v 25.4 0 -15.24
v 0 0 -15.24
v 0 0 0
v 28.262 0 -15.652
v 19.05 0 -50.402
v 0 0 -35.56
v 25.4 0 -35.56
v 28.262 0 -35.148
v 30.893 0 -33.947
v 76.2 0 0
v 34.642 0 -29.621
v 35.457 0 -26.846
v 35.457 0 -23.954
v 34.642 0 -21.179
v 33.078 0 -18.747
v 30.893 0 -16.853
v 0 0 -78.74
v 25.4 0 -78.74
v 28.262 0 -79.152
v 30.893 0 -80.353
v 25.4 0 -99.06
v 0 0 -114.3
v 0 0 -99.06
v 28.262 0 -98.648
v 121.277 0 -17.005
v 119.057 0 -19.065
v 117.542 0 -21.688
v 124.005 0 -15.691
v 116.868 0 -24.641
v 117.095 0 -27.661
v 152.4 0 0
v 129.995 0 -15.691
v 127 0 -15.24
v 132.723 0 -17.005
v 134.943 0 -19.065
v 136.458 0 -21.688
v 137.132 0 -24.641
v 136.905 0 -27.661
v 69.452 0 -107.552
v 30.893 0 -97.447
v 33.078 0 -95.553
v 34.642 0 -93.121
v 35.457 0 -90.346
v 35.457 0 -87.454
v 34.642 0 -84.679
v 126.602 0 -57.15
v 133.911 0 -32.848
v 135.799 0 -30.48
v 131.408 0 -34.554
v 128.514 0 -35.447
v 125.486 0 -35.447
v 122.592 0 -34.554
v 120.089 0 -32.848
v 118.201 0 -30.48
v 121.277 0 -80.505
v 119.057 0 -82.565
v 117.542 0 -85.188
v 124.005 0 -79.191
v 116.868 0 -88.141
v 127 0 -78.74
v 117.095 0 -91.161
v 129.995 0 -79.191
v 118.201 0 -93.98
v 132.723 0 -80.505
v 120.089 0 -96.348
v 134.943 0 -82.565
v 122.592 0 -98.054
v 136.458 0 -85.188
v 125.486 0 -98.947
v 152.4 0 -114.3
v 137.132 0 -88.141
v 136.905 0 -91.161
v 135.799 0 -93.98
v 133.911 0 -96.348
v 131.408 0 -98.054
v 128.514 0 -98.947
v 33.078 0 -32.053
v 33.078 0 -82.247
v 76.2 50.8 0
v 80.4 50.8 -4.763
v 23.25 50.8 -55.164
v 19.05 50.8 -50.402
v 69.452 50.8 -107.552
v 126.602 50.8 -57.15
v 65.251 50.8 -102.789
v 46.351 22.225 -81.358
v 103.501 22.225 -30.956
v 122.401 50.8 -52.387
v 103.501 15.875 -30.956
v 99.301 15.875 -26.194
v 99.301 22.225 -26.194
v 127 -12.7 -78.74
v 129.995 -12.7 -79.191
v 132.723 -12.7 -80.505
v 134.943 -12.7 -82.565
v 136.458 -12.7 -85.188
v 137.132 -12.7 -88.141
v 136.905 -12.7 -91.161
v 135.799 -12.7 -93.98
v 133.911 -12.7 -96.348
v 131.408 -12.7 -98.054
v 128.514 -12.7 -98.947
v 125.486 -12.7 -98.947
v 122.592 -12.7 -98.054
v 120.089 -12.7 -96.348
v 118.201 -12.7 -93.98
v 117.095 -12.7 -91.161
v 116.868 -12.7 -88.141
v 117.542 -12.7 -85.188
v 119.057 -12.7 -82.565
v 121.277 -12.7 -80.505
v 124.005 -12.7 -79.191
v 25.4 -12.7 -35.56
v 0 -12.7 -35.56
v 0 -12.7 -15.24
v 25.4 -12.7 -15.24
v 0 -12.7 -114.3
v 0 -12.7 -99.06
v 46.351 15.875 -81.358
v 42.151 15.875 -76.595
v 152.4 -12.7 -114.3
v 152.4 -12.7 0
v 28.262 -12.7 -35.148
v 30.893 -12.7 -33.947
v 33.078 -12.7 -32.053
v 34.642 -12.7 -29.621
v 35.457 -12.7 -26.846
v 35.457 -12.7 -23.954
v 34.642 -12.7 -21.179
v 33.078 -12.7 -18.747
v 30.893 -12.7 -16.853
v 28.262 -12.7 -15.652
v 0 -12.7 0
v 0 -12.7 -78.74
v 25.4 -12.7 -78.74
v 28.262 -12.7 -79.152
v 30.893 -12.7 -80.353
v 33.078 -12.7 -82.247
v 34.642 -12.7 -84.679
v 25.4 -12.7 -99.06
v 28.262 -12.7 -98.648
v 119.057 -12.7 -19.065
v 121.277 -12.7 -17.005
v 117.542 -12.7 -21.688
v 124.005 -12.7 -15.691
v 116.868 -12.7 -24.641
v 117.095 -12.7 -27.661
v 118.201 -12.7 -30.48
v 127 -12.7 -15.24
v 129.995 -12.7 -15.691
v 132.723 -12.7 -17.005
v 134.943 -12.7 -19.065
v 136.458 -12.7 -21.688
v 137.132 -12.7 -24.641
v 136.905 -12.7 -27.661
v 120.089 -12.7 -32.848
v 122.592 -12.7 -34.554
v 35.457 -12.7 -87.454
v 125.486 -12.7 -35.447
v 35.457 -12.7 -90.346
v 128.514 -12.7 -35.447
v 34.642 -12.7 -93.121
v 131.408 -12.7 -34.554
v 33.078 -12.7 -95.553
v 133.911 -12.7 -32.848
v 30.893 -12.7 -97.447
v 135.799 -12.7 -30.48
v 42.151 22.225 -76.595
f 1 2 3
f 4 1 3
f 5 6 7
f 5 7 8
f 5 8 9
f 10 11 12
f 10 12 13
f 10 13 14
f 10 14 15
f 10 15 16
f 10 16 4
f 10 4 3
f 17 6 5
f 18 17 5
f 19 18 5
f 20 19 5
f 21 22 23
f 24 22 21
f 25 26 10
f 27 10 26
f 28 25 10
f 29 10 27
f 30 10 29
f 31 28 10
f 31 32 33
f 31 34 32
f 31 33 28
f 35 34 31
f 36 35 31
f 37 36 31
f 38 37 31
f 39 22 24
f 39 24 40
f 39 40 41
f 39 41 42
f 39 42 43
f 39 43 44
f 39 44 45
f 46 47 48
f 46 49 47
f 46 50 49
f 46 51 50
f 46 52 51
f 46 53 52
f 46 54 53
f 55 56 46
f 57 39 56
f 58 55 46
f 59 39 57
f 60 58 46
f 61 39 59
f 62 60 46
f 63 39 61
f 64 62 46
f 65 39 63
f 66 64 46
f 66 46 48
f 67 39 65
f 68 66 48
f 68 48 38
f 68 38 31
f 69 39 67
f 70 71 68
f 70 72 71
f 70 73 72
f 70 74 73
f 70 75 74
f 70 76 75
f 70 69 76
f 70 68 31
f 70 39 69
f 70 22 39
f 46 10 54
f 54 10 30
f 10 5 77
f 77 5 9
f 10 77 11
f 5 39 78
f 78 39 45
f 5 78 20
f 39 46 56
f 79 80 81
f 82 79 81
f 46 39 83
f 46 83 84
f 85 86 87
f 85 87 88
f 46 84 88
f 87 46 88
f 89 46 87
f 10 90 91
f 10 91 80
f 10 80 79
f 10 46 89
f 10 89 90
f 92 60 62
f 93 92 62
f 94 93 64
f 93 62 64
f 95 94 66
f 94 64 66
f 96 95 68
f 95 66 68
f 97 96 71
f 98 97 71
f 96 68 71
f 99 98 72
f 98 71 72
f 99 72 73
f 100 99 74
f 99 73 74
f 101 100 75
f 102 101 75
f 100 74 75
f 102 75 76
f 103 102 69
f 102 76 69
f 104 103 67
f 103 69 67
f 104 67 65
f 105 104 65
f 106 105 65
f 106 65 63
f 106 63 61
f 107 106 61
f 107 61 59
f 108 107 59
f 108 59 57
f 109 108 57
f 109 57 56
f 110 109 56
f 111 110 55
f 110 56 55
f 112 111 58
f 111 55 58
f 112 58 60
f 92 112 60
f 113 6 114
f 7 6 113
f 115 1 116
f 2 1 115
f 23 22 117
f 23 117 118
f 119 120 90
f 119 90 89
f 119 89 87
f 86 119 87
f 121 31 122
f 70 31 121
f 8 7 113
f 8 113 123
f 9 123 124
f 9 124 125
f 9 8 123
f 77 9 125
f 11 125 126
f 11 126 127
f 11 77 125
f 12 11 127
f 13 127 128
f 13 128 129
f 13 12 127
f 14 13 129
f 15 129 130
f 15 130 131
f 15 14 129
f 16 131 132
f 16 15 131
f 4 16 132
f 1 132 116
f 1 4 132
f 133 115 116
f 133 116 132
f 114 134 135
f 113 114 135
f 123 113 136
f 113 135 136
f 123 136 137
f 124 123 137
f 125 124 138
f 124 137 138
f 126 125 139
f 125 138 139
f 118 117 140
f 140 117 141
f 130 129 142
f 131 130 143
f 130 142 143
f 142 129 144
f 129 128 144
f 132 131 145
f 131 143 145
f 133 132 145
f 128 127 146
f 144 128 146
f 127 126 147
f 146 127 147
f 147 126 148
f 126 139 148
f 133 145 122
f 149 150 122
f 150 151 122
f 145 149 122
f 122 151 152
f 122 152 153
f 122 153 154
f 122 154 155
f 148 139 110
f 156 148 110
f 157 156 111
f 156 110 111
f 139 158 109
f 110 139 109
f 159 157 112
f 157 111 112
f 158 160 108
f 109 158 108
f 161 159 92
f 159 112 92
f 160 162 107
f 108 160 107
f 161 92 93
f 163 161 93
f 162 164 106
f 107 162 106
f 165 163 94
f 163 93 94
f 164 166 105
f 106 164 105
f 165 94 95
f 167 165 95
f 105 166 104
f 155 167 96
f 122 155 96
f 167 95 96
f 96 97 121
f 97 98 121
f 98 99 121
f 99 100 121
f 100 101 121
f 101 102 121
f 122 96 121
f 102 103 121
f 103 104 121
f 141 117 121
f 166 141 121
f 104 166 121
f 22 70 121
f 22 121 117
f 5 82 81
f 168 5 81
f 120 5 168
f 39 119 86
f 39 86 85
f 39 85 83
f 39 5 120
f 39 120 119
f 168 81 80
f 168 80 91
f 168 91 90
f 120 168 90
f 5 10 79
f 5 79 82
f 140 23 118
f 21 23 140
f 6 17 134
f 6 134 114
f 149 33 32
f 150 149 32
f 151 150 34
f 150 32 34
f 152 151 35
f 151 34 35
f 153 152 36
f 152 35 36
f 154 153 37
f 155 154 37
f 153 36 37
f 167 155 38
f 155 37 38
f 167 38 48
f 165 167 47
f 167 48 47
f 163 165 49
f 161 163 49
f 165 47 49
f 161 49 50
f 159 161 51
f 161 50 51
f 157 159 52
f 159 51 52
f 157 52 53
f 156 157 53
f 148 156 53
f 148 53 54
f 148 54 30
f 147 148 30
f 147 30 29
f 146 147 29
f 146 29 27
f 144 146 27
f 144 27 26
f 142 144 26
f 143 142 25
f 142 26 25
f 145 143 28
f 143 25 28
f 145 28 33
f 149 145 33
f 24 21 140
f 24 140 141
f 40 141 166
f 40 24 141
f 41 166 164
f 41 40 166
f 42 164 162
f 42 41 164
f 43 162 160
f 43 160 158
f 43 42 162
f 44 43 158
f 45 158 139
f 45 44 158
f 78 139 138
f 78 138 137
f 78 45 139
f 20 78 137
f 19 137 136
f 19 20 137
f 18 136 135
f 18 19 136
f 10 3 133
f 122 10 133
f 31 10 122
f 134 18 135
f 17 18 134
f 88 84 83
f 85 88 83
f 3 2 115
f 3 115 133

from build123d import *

# Parameters (mm, degrees)
SKETCH3_R               = 10.16
BOSS_EXTRUDE2_DEPTH     = 12.7
BOSS_EXTRUDE3_DEPTH     = 50.8
CUT_EXTRUDE1_DEPTH      = 195.200593167
CUT_EXTRUDE1_DEPTH_BACK = 195.200593167


with BuildPart() as part:
    # Sketch3 → Boss-Extrude2 (new body)
    # profile 1 of 2: a face of its own
    with BuildSketch(Plane(origin=(0, 0, 0), x_dir=(1, 0, 0), z_dir=(0, 1, 0))):
        with BuildLine():
            Line((0, 57.15), (0, 35.56))
            Line((0, 35.56), (25.4, 35.56))
            ThreePointArc((25.4, 35.56), (35.56, 25.4), (25.4, 15.24))
            Line((25.4, 15.24), (0, 15.24))
            Line((0, 15.24), (0, 0))
            Line((0, 0), (152.4, 0))
            Line((152.4, 0), (152.4, 57.15))
            Line((152.4, 57.15), (0, 57.15))
        make_face()
        with Locations(Location((127, 25.4, 0), (0, 0, 270))):
            Circle(SKETCH3_R, mode=Mode.SUBTRACT)
    # profile 2 of 2: a face of its own
    with BuildSketch(Plane(origin=(0, 0, 0), x_dir=(1, 0, 0), z_dir=(0, 1, 0))):
        with BuildLine():
            Line((0, 78.74), (0, 57.15))
            Line((0, 57.15), (152.4, 57.15))
            Line((152.4, 57.15), (152.4, 114.3))
            Line((152.4, 114.3), (0, 114.3))
            Line((0, 114.3), (0, 99.06))
            Line((0, 99.06), (25.4, 99.06))
            ThreePointArc((25.4, 99.06), (35.56, 88.9), (25.4, 78.74))
            Line((25.4, 78.74), (0, 78.74))
        make_face()
        with Locations(Location((127, 88.9, 0), (0, 0, 270))):
            Circle(SKETCH3_R, mode=Mode.SUBTRACT)
    extrude(amount=-BOSS_EXTRUDE2_DEPTH)

    # Sketch4 → Boss-Extrude3 (add)
    with BuildSketch(Plane(origin=(0, 0, 0), x_dir=(1, 0, 0), z_dir=(0, 1, 0))):
        Polygon((76.2, 0), (19.05, 50.401562476), (69.451562476, 107.551562476), (126.601562476, 57.15), align=None)
    extrude(amount=BOSS_EXTRUDE3_DEPTH)

    # Sketch5 → Cut-Extrude1 (cut, two sides: drawn at the far end of the back side and taken through both)
    with BuildSketch(Plane(origin=(42.8625, 0, 37.801171857), x_dir=(0.661437827766148, 0, -0.7499999999999998), z_dir=(0.7499999999999998, 0, 0.661437827766148)).offset(-CUT_EXTRUDE1_DEPTH_BACK)):
        Polygon((56.751562476, 50.8), (85.326562476, 22.225), (85.326562476, 15.875), (91.676562476, 15.875), (91.676562476, 22.225), (120.251562476, 50.8), align=None)
    extrude(amount=CUT_EXTRUDE1_DEPTH + CUT_EXTRUDE1_DEPTH_BACK, mode=Mode.SUBTRACT)


solid = part.part
